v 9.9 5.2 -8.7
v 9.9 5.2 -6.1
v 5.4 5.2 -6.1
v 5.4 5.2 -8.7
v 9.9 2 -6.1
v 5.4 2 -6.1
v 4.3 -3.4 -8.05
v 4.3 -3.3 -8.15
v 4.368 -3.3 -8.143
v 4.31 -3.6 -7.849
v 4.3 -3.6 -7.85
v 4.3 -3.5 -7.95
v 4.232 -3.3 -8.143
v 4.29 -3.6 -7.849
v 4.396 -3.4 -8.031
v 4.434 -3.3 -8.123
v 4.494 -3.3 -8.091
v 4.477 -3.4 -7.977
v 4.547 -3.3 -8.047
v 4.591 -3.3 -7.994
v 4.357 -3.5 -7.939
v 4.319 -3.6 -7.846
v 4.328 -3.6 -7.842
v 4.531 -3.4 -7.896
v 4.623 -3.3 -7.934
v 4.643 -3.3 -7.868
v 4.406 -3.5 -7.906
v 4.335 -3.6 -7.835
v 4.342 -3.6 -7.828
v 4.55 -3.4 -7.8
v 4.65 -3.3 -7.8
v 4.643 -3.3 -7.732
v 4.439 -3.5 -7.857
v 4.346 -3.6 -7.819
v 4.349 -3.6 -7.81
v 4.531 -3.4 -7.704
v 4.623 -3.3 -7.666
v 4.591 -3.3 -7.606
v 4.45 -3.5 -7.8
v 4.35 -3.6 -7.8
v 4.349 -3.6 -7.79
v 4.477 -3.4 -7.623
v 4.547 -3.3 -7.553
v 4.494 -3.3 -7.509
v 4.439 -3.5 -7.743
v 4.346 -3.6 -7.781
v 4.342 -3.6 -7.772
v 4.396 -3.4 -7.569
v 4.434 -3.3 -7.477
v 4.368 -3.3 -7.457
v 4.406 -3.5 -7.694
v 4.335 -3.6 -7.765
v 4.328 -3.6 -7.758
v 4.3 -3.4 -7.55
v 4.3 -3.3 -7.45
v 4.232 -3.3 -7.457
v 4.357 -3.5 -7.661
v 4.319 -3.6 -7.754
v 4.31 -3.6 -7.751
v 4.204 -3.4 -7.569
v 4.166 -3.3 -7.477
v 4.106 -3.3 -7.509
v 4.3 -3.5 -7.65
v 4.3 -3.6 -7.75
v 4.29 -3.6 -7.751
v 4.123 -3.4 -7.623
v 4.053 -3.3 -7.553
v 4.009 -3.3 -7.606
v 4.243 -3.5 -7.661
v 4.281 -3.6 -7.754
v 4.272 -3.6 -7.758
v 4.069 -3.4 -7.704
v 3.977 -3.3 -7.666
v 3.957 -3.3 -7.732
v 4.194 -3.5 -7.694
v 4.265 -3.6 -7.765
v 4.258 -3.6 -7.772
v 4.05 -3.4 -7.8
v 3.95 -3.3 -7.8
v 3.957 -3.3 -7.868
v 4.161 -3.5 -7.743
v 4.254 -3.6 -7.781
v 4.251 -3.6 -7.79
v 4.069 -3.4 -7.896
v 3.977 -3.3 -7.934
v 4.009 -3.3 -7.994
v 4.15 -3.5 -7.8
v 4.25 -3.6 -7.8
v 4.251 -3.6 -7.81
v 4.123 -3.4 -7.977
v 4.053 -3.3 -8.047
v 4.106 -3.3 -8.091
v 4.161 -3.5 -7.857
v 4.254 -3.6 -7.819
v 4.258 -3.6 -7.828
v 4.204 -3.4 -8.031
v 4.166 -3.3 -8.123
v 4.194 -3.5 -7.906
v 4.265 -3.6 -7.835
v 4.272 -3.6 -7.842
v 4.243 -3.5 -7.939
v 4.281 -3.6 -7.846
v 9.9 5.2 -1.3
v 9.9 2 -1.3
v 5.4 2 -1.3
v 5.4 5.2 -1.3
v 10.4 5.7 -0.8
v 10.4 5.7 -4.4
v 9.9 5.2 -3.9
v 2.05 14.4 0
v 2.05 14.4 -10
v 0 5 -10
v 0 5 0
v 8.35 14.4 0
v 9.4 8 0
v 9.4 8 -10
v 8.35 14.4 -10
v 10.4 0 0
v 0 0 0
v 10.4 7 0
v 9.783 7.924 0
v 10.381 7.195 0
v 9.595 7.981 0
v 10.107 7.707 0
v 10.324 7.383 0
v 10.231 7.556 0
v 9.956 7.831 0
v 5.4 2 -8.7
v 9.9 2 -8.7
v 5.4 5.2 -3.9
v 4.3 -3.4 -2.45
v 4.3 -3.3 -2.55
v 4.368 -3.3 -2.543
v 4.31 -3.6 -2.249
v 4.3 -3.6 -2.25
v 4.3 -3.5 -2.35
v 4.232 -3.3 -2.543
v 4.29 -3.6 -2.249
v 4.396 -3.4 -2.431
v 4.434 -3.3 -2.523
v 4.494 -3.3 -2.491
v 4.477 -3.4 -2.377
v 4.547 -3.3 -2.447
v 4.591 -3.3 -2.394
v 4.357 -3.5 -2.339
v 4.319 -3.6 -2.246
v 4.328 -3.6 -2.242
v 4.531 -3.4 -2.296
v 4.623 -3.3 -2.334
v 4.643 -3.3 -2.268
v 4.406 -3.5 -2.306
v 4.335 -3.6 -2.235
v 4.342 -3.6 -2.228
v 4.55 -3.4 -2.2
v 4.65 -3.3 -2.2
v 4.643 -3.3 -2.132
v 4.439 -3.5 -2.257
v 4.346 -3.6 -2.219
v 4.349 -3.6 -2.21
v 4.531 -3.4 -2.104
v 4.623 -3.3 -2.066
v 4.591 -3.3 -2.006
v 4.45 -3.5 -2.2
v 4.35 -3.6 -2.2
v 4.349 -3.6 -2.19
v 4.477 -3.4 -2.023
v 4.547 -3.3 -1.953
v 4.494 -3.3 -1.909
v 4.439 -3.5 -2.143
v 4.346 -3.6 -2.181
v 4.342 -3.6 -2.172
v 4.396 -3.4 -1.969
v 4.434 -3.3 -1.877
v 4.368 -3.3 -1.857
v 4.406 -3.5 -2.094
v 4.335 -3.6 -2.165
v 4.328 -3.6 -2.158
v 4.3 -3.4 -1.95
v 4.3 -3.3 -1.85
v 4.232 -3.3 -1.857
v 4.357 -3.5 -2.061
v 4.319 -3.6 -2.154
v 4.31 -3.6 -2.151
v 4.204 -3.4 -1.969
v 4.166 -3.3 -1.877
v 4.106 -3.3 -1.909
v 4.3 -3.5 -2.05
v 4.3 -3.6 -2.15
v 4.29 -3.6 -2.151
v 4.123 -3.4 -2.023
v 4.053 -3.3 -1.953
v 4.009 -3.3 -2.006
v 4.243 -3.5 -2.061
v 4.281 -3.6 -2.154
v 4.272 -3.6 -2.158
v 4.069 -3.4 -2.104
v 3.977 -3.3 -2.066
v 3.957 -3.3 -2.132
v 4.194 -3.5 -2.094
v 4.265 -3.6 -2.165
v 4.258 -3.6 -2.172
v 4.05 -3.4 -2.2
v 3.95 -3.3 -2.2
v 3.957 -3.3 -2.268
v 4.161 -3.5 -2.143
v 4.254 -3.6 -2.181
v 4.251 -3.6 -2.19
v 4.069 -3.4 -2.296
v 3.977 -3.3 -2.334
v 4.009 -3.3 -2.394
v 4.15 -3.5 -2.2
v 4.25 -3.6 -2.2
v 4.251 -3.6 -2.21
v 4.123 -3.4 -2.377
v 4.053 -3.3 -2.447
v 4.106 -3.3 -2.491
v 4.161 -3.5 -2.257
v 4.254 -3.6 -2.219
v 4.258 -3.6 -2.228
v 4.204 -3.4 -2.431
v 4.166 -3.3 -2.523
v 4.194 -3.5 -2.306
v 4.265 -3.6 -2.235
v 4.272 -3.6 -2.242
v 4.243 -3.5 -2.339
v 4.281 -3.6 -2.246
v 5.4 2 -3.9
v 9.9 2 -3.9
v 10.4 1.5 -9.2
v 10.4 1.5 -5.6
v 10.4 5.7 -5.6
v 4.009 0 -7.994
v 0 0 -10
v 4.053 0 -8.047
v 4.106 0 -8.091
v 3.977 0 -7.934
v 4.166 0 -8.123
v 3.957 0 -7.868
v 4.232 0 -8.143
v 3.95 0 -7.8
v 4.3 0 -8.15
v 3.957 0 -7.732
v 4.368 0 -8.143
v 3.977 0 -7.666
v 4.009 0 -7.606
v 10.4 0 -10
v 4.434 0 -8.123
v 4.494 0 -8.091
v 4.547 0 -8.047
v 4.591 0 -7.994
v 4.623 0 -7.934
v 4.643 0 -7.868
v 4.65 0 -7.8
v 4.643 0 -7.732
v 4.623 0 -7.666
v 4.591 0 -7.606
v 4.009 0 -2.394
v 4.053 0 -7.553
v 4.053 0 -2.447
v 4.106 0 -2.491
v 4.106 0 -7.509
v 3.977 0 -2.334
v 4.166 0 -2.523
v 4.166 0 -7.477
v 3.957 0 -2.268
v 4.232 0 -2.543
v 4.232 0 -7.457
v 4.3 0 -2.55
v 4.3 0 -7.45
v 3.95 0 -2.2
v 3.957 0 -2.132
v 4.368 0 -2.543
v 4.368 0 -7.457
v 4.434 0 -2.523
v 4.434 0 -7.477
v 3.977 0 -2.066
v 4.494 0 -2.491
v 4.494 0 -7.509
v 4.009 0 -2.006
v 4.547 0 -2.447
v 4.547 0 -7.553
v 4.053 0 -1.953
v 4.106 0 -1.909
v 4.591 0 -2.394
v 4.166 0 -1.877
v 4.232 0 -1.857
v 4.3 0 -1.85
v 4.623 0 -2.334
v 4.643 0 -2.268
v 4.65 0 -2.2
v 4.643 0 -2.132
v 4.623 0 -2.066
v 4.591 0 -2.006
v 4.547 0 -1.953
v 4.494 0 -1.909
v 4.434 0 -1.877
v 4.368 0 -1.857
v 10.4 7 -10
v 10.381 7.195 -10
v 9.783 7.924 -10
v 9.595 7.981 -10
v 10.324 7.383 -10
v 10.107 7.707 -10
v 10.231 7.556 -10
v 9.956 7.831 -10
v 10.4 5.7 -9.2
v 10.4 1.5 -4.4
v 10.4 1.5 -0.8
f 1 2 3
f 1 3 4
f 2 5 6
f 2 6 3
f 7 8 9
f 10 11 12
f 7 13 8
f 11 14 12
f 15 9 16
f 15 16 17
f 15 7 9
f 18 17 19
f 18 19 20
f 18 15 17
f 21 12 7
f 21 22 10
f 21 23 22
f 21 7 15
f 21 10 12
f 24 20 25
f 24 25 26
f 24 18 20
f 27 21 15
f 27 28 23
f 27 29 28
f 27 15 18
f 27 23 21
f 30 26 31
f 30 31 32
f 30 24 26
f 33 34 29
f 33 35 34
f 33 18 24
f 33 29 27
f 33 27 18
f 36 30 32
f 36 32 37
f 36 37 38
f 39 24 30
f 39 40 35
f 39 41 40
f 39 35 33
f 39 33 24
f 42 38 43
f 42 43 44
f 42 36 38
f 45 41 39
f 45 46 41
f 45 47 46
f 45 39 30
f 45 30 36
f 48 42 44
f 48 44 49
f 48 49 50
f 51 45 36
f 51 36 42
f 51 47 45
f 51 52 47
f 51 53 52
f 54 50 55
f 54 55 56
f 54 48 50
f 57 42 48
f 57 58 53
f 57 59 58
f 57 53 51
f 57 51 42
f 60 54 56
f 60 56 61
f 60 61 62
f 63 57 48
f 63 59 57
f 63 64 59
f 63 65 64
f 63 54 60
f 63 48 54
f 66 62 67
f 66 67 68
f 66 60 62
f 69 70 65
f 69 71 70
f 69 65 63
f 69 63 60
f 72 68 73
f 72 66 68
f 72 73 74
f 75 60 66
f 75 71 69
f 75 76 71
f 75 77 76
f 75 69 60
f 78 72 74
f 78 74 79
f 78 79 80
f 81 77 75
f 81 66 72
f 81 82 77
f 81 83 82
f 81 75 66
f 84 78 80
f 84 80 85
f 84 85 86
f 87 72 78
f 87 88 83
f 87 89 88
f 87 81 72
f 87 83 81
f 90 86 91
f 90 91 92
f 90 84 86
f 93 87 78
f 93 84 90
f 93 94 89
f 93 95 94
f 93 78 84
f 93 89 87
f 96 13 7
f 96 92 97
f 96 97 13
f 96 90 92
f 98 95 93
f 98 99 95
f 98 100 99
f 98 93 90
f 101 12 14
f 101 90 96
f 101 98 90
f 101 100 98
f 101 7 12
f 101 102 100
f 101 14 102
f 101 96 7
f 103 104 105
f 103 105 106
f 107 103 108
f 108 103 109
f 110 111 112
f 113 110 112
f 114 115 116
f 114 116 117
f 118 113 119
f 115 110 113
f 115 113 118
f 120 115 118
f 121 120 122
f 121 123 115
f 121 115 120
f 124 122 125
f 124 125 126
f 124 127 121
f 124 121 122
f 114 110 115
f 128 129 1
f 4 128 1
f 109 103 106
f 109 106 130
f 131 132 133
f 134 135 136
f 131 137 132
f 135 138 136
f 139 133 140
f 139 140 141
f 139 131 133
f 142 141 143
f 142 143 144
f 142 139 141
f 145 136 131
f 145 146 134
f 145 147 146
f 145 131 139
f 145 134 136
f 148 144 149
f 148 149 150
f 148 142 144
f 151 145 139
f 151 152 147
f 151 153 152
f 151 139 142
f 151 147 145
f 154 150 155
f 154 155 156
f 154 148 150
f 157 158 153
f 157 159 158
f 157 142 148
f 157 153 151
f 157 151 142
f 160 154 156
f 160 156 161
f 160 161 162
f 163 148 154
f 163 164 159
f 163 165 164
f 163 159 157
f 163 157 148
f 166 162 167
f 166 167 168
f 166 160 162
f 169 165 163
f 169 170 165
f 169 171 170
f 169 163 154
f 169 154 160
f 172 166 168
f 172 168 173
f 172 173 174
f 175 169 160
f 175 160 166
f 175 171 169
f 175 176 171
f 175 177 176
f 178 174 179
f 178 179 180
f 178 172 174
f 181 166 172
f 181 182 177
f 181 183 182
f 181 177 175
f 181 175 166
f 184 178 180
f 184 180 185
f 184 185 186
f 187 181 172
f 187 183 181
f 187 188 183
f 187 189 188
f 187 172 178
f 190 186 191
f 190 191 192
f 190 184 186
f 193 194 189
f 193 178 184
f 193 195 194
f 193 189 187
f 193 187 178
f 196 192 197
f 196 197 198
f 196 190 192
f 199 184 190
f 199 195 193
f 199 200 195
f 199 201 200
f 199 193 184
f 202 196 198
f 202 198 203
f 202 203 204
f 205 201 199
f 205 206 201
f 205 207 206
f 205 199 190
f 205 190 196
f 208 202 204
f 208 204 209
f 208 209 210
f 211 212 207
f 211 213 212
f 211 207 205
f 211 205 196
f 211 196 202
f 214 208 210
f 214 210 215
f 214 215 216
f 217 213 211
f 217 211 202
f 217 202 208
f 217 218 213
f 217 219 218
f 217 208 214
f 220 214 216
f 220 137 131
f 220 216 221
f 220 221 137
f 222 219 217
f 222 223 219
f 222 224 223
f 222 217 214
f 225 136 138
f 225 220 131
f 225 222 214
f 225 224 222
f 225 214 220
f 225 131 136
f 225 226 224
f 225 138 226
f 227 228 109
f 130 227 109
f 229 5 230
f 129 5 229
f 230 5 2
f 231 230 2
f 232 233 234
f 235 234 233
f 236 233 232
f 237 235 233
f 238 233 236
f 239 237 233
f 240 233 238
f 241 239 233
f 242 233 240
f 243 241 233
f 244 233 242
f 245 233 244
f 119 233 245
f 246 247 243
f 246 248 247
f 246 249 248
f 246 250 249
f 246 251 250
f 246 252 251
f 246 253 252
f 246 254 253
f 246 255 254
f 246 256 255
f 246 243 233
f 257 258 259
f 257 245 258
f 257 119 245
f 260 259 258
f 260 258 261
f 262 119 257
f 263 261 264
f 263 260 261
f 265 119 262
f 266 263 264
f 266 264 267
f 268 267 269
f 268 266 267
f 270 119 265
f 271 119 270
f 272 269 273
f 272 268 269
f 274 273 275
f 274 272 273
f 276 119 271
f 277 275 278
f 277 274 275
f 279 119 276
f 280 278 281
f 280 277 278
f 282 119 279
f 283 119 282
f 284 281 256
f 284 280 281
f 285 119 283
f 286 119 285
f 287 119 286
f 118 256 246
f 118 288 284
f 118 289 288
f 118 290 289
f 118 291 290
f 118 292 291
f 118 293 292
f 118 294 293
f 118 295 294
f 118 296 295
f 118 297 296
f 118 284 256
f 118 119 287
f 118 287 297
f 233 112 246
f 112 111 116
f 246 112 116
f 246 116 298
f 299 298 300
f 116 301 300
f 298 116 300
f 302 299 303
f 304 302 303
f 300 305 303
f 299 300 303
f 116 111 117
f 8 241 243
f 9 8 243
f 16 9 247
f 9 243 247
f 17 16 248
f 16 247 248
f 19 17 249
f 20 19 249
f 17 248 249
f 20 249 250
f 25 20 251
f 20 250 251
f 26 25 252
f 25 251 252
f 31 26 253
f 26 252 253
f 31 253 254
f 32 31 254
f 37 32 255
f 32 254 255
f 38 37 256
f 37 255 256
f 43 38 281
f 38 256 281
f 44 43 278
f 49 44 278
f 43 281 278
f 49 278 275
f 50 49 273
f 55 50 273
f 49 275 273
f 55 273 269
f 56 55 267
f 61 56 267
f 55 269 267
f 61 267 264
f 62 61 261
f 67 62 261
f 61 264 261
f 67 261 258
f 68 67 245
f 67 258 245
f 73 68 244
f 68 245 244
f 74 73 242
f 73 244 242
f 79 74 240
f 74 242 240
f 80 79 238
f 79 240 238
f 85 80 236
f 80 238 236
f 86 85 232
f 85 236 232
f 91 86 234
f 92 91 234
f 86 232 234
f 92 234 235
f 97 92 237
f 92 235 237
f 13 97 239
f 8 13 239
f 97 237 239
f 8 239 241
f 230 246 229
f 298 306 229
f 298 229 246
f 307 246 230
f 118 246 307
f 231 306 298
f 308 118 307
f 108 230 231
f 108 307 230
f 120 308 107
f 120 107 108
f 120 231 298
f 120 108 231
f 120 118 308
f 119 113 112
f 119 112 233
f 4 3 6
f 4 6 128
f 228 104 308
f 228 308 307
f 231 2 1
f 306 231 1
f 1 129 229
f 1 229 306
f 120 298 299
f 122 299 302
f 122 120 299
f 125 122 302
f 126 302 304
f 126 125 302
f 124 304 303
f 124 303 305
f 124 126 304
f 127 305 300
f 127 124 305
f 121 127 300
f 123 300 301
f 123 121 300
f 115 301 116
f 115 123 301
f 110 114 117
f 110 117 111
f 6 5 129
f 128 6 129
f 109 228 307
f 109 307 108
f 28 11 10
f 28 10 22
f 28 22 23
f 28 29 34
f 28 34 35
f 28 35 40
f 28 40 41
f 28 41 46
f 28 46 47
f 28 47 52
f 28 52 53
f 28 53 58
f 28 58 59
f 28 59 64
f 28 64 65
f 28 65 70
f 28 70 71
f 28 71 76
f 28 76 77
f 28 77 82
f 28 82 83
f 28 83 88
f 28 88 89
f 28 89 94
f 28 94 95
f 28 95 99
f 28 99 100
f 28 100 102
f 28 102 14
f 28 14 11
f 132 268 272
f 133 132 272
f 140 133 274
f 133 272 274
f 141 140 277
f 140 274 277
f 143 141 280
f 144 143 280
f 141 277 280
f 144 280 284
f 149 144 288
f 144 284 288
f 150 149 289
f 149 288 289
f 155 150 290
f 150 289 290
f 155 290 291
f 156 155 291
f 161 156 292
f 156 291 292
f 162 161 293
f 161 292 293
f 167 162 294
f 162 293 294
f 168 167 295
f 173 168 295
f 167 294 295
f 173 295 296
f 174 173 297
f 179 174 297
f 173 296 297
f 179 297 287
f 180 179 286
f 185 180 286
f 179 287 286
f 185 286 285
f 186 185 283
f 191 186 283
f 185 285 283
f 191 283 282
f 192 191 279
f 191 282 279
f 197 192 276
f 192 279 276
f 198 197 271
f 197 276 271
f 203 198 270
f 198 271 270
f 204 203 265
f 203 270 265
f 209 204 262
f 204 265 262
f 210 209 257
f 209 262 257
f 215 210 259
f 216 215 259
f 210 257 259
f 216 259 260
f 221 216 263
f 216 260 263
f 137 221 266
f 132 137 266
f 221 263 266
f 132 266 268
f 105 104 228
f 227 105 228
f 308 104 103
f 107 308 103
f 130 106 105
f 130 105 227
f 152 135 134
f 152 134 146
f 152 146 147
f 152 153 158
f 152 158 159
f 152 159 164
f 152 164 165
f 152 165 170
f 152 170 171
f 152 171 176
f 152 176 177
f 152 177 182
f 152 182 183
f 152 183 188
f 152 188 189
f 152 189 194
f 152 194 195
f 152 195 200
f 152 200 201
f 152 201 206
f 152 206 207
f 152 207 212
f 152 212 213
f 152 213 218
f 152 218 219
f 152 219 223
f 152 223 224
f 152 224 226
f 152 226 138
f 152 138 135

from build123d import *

# Parameters (mm, degrees)
RESSALTO_EXTRUS_O2_DEPTH = 10
ESBO_O4_W                = 2.6
ESBO_O4_H                = 3.2
CORTE_EXTRUS_O1_DEPTH    = 5
CHANFRO2_SIZE            = 0.5
CHANFRO3_SIZE            = 0.5
ESBO_O10_R               = 0.35
RESSALTO_EXTRUS_O5_DEPTH = 3.6
CHANFRO4_SIZE            = 0.3


with BuildPart() as part:
    # Esboço2 → Ressalto-extrusão2 (new body)
    with BuildSketch(Plane.XY):
        with BuildLine():
            Line((0, 0), (10.4, 0))
            Line((10.4, 0), (10.4, 7))
            ThreePointArc((10.4, 7), (10.107106781, 7.707106781), (9.4, 8))
            Line((9.4, 8), (8.35, 14.4))
            Line((8.35, 14.4), (5.2, 14.4))
            Line((5.2, 14.4), (2.05, 14.4))
            Line((2.05, 14.4), (0, 5))
            Line((0, 5), (0, 0))
        make_face()
    extrude(amount=-RESSALTO_EXTRUS_O2_DEPTH)

    # Esboço4 → Corte-extrusão1 (cut)
    with BuildSketch(Plane(origin=(10.4, 0, 0), x_dir=(0, 0, -1), z_dir=(1, 0, 0))):
        with Locations((2.6, 3.6)):
            Rectangle(ESBO_O4_W, ESBO_O4_H)
        with Locations((7.4, 3.6)):
            Rectangle(ESBO_O4_W, ESBO_O4_H)
    extrude(amount=-CORTE_EXTRUS_O1_DEPTH, mode=Mode.SUBTRACT)

    # Chanfro2
    chanfro2_edges = [part.edges().sort_by_distance(p)[0] for p in [
        (10.4, 3.6, -1.3),
        (10.4, 2, -2.6),
        (10.4, 3.6, -3.9),
        (10.4, 5.2, -2.6),
    ]]
    chamfer(chanfro2_edges, length=CHANFRO2_SIZE)

    # Chanfro3
    chanfro3_edges = [part.edges().sort_by_distance(p)[0] for p in [
        (10.4, 3.6, -8.7),
        (10.4, 5.2, -7.4),
        (10.4, 3.6, -6.1),
        (10.4, 2, -7.4),
    ]]
    chamfer(chanfro3_edges, length=CHANFRO3_SIZE)

    # Esboço10 → Ressalto-extrusão5 (add)
    with BuildSketch(Plane.XZ):
        with Locations(Location((4.3, -2.2, 0), (0, 0, 270))):
            Circle(ESBO_O10_R)
        with Locations(Location((4.3, -7.8, 0), (0, 0, 270))):
            Circle(ESBO_O10_R)
    extrude(amount=RESSALTO_EXTRUS_O5_DEPTH)

    # Chanfro4
    chanfro4_edges = [part.edges().sort_by_distance(p)[0] for p in [
        (4.3, -3.6, -1.85),
        (4.3, -3.6, -7.45),
    ]]
    chamfer(chanfro4_edges, length=CHANFRO4_SIZE)


solid = part.part
